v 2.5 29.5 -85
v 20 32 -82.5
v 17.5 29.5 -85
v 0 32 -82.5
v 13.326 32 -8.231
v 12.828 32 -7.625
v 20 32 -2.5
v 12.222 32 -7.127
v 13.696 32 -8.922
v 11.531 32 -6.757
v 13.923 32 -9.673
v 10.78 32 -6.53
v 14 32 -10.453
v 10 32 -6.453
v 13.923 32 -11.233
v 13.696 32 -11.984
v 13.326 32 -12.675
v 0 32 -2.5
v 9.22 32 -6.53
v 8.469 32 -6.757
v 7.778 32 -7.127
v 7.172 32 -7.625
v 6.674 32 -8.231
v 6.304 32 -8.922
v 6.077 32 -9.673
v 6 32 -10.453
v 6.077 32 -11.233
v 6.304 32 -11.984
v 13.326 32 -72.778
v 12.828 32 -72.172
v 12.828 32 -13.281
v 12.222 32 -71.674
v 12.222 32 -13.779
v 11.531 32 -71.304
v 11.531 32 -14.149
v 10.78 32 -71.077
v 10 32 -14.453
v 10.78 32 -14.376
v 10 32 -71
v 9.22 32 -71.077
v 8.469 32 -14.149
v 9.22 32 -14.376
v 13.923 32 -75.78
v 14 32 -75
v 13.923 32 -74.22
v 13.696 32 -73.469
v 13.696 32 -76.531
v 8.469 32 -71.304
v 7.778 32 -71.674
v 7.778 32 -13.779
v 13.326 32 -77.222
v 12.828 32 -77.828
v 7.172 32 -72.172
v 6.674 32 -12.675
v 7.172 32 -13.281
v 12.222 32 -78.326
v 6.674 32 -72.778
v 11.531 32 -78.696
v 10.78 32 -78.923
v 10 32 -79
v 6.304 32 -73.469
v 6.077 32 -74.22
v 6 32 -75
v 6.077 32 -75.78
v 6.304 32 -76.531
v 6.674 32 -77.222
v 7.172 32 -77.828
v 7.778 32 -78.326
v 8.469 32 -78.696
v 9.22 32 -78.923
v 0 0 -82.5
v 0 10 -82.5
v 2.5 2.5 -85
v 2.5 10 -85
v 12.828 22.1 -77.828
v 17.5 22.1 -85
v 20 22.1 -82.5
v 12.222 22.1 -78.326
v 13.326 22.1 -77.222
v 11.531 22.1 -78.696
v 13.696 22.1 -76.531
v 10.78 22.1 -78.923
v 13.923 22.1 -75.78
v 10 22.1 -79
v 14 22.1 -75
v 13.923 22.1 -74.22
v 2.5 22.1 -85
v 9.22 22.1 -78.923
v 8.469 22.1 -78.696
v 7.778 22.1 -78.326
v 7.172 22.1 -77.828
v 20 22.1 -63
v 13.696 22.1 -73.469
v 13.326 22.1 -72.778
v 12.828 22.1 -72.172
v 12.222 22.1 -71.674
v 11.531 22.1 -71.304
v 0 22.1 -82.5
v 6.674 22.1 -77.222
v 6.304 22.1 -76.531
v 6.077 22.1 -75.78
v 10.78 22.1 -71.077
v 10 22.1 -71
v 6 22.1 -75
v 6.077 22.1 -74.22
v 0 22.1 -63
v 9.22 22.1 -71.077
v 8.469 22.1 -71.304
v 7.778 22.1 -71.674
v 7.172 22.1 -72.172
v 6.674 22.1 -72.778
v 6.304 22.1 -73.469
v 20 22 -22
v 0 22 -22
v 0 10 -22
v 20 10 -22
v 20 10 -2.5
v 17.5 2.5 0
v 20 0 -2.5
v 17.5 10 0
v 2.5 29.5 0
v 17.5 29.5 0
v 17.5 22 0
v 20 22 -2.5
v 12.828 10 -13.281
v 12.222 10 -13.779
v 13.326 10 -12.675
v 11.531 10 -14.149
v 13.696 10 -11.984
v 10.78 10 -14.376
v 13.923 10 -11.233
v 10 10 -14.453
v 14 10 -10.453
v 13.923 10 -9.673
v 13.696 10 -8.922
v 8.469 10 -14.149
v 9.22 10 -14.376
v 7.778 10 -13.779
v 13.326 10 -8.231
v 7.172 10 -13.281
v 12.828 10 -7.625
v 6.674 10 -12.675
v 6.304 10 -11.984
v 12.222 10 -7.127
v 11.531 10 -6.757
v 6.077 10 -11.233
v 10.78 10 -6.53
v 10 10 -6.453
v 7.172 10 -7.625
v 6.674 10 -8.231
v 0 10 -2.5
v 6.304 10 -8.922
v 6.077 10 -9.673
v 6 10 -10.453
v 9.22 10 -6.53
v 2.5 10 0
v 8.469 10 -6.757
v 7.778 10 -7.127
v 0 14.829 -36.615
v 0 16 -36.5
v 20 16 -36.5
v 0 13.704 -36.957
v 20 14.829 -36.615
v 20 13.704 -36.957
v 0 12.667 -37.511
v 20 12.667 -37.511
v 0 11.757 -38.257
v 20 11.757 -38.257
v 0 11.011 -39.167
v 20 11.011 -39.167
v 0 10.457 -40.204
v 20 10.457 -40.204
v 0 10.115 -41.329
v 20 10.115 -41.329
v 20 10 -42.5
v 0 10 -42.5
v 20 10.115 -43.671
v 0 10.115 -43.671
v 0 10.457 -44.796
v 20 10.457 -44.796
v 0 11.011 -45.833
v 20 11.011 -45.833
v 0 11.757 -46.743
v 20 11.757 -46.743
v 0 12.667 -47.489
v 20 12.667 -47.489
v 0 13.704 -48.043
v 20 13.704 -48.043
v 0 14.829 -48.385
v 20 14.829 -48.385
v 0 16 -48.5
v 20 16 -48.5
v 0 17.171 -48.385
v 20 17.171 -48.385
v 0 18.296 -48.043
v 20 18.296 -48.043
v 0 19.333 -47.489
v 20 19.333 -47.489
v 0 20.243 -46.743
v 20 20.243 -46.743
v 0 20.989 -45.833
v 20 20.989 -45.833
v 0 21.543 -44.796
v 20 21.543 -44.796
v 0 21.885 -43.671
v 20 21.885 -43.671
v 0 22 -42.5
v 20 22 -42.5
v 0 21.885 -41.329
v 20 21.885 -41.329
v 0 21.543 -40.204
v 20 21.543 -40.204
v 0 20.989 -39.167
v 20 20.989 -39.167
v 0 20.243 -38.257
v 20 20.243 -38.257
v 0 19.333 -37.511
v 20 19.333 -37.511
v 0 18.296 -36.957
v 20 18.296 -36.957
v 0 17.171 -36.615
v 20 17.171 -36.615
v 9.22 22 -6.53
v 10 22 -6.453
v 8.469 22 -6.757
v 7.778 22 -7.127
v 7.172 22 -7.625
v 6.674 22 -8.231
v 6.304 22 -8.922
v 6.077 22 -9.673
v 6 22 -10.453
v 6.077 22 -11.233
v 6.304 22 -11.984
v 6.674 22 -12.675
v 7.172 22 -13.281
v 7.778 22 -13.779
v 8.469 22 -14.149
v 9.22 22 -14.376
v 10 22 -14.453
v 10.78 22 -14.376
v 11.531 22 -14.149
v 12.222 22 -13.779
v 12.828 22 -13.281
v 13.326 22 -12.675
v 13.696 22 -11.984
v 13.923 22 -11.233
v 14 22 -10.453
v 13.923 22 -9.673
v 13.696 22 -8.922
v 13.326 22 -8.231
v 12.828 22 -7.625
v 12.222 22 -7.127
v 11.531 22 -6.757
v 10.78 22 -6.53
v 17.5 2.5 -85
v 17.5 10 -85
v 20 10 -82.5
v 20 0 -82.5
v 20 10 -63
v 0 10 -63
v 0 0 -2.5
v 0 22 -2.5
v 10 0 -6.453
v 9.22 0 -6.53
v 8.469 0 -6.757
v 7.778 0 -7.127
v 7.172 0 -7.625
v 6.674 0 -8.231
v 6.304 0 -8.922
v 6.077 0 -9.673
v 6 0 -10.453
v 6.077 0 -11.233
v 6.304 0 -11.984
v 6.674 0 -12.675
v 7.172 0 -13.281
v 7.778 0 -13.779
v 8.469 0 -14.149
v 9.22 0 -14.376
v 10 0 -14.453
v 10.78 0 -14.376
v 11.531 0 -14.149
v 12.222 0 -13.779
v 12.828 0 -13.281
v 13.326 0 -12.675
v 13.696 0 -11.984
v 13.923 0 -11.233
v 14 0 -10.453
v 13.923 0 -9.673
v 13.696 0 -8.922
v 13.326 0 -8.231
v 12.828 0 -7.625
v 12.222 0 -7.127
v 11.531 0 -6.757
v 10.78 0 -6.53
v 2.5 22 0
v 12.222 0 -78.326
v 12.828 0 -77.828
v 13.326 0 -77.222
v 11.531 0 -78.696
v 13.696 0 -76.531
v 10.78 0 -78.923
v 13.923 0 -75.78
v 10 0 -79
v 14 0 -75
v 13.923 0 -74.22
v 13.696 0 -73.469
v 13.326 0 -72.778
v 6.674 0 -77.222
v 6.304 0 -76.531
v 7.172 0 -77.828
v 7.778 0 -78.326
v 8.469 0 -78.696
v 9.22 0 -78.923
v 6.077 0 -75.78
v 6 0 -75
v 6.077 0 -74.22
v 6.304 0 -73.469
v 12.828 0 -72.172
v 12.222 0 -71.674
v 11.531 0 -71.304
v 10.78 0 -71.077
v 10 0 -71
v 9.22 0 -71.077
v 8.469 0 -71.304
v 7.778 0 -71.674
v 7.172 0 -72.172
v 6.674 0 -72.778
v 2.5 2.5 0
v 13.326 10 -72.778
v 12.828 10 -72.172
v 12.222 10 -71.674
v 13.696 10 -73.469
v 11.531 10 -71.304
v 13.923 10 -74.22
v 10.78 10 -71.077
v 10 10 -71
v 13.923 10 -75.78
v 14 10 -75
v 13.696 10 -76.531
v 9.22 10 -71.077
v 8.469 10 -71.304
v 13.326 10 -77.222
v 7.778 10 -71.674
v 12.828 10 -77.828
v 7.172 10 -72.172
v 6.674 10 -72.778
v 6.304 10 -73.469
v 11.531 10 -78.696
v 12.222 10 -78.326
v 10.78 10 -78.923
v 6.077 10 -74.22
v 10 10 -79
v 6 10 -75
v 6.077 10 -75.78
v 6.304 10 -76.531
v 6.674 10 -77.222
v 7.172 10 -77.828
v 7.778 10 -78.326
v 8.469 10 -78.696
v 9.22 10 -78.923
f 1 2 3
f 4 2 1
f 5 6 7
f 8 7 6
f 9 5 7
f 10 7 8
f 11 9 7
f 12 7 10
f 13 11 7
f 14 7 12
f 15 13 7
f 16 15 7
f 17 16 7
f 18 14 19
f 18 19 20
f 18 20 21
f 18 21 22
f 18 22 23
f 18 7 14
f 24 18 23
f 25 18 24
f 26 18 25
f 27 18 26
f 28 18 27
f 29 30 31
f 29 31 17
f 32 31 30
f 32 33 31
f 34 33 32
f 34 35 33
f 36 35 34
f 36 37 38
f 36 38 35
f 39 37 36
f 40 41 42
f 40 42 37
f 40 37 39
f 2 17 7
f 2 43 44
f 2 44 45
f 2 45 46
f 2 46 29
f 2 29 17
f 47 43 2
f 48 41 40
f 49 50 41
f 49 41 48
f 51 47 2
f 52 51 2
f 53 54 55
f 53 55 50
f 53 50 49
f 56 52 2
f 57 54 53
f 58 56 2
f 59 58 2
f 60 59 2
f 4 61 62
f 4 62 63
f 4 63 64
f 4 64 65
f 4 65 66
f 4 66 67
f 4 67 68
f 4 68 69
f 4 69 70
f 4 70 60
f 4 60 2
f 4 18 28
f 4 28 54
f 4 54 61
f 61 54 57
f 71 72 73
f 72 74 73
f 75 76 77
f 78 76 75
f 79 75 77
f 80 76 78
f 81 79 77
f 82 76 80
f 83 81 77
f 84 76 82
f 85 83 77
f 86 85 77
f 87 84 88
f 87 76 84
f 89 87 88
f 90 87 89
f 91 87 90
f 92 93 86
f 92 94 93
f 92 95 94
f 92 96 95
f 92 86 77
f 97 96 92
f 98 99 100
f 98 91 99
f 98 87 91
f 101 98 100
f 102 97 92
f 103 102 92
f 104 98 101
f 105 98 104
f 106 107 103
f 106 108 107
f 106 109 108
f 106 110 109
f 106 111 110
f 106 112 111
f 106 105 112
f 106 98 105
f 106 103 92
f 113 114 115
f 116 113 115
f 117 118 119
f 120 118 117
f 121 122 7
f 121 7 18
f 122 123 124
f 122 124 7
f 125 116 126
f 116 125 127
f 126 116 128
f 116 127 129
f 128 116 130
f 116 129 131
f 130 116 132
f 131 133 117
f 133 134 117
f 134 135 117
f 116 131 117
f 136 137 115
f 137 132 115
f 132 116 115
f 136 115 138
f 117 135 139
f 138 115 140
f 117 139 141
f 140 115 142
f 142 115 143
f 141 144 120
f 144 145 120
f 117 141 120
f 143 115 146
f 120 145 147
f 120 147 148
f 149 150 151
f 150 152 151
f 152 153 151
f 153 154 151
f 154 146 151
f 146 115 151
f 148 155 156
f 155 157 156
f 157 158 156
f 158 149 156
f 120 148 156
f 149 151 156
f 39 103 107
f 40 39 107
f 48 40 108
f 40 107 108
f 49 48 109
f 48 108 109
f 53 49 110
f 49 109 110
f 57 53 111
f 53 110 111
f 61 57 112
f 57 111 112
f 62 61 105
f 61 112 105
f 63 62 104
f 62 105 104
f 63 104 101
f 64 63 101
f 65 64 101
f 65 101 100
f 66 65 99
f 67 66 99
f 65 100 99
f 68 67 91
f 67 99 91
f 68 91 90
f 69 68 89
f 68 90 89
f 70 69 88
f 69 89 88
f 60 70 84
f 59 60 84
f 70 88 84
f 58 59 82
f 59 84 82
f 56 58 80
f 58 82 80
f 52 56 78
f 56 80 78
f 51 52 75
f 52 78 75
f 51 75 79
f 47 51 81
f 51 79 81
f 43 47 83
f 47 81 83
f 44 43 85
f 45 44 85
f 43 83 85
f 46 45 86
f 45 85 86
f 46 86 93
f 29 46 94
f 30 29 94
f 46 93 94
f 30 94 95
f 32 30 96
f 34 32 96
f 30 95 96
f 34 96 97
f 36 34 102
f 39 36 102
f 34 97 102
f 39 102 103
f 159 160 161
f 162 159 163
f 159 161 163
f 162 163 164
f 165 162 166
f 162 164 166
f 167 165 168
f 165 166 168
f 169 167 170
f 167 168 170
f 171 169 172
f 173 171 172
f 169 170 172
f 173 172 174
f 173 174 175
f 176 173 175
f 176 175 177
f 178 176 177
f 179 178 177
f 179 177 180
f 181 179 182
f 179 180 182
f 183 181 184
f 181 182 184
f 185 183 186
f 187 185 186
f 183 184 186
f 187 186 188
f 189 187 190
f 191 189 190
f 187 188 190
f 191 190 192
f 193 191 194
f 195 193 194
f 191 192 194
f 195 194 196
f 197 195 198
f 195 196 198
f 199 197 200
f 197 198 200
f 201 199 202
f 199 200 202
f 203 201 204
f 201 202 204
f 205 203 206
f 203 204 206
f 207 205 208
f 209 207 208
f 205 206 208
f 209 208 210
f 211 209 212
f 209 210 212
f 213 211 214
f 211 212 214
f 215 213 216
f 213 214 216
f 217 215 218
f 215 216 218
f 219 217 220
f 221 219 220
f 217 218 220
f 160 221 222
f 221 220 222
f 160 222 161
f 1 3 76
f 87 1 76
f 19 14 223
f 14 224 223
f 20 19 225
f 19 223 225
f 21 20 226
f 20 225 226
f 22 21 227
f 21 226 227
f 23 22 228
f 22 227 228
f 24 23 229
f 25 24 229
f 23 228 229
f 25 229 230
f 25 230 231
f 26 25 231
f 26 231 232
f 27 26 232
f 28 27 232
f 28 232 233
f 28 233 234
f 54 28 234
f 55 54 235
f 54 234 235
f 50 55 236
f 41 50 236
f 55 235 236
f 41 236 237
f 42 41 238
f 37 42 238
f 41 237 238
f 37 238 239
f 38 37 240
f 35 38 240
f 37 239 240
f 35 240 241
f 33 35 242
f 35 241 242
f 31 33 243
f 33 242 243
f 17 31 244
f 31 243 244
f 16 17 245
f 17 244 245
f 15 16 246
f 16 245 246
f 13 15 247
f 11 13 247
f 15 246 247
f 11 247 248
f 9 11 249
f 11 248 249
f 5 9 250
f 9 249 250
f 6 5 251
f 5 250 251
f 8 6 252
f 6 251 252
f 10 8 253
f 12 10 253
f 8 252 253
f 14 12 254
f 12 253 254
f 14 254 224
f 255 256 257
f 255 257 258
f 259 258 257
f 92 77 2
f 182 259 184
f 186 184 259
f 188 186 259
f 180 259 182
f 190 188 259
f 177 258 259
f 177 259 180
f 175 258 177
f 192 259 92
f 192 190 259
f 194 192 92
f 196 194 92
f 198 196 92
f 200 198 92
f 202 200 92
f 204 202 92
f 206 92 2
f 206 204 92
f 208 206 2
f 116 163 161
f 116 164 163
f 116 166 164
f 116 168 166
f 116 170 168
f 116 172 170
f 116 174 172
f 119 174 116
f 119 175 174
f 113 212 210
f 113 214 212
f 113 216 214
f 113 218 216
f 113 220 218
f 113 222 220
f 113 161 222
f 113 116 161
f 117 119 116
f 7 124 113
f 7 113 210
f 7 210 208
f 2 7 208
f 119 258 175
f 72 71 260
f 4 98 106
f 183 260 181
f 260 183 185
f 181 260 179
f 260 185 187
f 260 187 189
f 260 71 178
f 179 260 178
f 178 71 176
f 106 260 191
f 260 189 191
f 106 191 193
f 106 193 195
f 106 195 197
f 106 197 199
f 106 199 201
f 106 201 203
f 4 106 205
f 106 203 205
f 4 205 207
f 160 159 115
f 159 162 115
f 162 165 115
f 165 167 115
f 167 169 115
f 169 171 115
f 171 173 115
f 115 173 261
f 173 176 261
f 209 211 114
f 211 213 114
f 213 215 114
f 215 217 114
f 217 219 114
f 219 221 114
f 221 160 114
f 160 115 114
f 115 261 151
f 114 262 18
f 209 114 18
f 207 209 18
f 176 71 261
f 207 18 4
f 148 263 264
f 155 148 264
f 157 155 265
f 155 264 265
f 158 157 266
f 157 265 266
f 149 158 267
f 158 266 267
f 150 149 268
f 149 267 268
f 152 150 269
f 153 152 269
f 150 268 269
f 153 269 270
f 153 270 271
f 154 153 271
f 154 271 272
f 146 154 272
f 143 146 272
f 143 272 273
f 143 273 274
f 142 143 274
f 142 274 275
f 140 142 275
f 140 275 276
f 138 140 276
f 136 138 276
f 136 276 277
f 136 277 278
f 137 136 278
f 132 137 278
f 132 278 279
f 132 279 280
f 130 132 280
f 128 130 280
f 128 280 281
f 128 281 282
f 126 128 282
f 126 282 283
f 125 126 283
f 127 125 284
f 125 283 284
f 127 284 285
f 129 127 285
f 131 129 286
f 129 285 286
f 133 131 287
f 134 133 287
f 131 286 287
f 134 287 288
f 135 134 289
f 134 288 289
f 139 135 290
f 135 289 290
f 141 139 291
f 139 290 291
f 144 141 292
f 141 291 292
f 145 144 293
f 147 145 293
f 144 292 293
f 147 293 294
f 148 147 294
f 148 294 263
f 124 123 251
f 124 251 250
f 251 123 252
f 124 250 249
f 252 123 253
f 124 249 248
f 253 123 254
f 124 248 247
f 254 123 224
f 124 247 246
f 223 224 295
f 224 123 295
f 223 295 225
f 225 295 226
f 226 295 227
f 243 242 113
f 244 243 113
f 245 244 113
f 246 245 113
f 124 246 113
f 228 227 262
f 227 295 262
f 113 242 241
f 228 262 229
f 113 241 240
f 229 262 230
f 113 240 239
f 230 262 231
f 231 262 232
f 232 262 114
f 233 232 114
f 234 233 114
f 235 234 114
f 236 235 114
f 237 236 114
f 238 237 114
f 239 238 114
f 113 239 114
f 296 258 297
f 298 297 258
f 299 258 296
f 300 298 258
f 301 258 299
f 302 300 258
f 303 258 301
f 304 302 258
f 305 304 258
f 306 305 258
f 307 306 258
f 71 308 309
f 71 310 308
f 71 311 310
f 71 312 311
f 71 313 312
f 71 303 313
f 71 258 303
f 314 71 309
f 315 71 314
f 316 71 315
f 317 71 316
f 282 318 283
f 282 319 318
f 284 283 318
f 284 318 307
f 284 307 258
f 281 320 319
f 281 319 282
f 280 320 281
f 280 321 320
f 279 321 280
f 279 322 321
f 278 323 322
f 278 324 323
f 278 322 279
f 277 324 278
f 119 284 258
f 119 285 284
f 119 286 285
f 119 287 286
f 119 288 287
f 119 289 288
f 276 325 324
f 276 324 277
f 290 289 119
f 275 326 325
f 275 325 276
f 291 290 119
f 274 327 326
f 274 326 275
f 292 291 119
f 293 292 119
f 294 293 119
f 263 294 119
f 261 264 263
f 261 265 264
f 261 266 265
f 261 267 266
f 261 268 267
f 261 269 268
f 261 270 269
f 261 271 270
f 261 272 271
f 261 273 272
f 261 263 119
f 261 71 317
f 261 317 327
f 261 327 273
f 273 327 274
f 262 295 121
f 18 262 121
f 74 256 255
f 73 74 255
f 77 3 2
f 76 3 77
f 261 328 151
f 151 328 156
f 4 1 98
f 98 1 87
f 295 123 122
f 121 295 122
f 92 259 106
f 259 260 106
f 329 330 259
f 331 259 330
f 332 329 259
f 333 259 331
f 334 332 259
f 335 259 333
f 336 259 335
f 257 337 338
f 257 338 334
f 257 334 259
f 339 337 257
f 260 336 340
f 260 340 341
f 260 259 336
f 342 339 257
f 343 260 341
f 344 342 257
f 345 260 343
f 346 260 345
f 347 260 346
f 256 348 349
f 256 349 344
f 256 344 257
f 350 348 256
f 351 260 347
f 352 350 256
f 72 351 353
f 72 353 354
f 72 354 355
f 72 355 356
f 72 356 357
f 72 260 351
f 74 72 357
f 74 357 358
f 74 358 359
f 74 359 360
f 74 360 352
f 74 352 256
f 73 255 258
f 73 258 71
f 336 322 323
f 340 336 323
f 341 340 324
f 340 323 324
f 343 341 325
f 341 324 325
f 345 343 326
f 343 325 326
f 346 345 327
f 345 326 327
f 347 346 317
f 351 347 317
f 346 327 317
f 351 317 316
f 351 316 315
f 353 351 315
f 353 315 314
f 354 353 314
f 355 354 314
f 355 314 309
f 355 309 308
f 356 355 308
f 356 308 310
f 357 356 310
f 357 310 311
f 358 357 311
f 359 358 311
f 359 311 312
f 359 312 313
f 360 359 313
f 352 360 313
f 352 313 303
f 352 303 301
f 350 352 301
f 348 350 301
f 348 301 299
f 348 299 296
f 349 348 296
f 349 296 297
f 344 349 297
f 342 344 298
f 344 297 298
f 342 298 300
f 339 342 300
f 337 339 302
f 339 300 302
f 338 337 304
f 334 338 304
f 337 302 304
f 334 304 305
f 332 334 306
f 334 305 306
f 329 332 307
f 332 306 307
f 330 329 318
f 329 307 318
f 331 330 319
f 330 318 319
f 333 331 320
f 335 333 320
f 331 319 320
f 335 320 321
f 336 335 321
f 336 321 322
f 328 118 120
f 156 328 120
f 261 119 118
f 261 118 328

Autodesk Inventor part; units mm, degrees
ref_plane "YZ Plane" through (0, 0, 0) normal (1, 0, 0) x (0, 1, 0)
ref_plane "XZ Plane" through (0, 0, 0) normal (0, 1, 0) x (-1, 0, 0)
ref_plane "XY Plane" through (0, 0, 0) normal (0, 0, 1) x (1, 0, 0)
sketch "Skizze1" plane through (0, 0, 0) normal (1, 0, 0) x (0, 1, 0)
  line L0 (0, -102) -> (0, 17) projected
  line L1 (-6.4, 0) -> (38.4, 0) projected
  line L2 (0, 0) -> (32, 0)
  line L3 (32, 0) -> (32, -85)
  line L4 (32, -85) -> (0, -85)
  line L5 (0, -85) -> (0, 0)
  line L6 (0, 0) -> (10, 0)
  line L7 (10, 0) -> (22, 0)
  line L8 (22, 0) -> (22, -22)
  line L9 (10, -22) -> (10, 0)
  line L10 (10, -85) -> (22.1, -85)
  line L11 (22.1, -85) -> (22.1, -63)
  line L12 (10, -63) -> (10, -85)
  line L13 (22, -22) -> (10, -22)
  line L14 (10, -63) -> (22.1, -63)
  line L15 (32, -2.5) -> (22, -2.5)
  line L16 (10, -2.5) -> (0, -2.5)
  line L17 (32, -85) -> (32, -82.5)
  line L18 (32, -82.5) -> (22.1, -82.5)
  line L19 (10, -82.5) -> (0, -82.5)
  point P0 (16, -42.5)
  dimension "d0" = 32
  dimension "d1" = 85
  dimension "d2" = 10
  dimension "d4" = 22
  dimension "d5" = 12
  dimension "d8" = 2.5
extrude "Extrusion2" add sketch "Skizze1" along normal blind 20 contours L0 L19 L12 L4 | L0 L16 L9 L13 L8 L15 L3 L18 L11 L14 L12 L19 | L0 L1 L9 L16 | L11 L18 L3 L4 | L1 L3 L15 L8
chamfer "Fasen5" distance 2.5 angle 45 1 edges at (10, 0, -85) measured on face at (6.6667, 0, -28.3333)
chamfer "Fasen6" distance 2.5 angle 45 1 edges at (10, 32, -85) measured on face at (6.6667, 32, -56.6667)
chamfer "Fasen7" distance 2.5 angle 45 1 edges at (10, 32, 0) measured on face at (13.3333, 32, -55)
chamfer "Fasen8" distance 2.5 angle 45 1 edges at (10, 0, 0) measured on face at (13.3333, 0, -27.5)
hole "Bohrung1" at (0, 16, -42.5) direction (1, 0, 0) diameter 12 end through all
thread "Gewinde1" size "M12x1.75" class "6H" standard "ANSI Metric M Profile" full length
sketch "Skizze2" plane through (0, 32, -82.5) normal (0, 1, 0) x (1, 0, 0)
  line L0 (0, 2.5) -> (0, -19.5) projected
  line L1 (0, 2.5) -> (0, -7.5)
  point P0 (0, -82.5)
  point P1 (10, -7.5)
  point P2 (0, -72.5)
  point P3 (10, -72.047)
hole "Bohrung2" at (10, 32, -75) at (10, 32, -10.453) direction (0, -1, 0) diameter 8 end through all
chamfer "Fasen9" distance 2.5 angle 45 1 edges at (20, 25.75, 0) measured on face at (13.3333, 27, 0)
chamfer "Fasen10" distance 2.5 angle 45 1 edges at (20, 6.25, 0) measured on face at (13.3333, 7.5, 0)
chamfer "Fasen11" distance 2.5 angle 45 1 edges at (20, 25.8, -85) measured on face at (13.3333, 24.5667, -85)
chamfer "Fasen12" distance 2.5 angle 45 1 edges at (20, 6.25, -85) measured on face at (13.3333, 5, -85)
chamfer "Fasen13" distance 2.5 angle 45 1 edges at (0, 25.8, -85) measured on face at (5.8333, 24.5667, -85)
chamfer "Fasen14" distance 2.5 angle 45 1 edges at (0, 6.25, -85) measured on face at (5.8333, 5, -85)
chamfer "Fasen15" distance 2.5 angle 45 1 edges at (0, 25.75, 0) measured on face at (0, 28.6521, -42.2589)
chamfer "Fasen16" distance 2.5 angle 45 1 edges at (0, 6.25, 0) measured on face at (0, 3.3479, -42.7411)
properties part number "Abzieher_Trägeript" material "1.0038 S235JR"
